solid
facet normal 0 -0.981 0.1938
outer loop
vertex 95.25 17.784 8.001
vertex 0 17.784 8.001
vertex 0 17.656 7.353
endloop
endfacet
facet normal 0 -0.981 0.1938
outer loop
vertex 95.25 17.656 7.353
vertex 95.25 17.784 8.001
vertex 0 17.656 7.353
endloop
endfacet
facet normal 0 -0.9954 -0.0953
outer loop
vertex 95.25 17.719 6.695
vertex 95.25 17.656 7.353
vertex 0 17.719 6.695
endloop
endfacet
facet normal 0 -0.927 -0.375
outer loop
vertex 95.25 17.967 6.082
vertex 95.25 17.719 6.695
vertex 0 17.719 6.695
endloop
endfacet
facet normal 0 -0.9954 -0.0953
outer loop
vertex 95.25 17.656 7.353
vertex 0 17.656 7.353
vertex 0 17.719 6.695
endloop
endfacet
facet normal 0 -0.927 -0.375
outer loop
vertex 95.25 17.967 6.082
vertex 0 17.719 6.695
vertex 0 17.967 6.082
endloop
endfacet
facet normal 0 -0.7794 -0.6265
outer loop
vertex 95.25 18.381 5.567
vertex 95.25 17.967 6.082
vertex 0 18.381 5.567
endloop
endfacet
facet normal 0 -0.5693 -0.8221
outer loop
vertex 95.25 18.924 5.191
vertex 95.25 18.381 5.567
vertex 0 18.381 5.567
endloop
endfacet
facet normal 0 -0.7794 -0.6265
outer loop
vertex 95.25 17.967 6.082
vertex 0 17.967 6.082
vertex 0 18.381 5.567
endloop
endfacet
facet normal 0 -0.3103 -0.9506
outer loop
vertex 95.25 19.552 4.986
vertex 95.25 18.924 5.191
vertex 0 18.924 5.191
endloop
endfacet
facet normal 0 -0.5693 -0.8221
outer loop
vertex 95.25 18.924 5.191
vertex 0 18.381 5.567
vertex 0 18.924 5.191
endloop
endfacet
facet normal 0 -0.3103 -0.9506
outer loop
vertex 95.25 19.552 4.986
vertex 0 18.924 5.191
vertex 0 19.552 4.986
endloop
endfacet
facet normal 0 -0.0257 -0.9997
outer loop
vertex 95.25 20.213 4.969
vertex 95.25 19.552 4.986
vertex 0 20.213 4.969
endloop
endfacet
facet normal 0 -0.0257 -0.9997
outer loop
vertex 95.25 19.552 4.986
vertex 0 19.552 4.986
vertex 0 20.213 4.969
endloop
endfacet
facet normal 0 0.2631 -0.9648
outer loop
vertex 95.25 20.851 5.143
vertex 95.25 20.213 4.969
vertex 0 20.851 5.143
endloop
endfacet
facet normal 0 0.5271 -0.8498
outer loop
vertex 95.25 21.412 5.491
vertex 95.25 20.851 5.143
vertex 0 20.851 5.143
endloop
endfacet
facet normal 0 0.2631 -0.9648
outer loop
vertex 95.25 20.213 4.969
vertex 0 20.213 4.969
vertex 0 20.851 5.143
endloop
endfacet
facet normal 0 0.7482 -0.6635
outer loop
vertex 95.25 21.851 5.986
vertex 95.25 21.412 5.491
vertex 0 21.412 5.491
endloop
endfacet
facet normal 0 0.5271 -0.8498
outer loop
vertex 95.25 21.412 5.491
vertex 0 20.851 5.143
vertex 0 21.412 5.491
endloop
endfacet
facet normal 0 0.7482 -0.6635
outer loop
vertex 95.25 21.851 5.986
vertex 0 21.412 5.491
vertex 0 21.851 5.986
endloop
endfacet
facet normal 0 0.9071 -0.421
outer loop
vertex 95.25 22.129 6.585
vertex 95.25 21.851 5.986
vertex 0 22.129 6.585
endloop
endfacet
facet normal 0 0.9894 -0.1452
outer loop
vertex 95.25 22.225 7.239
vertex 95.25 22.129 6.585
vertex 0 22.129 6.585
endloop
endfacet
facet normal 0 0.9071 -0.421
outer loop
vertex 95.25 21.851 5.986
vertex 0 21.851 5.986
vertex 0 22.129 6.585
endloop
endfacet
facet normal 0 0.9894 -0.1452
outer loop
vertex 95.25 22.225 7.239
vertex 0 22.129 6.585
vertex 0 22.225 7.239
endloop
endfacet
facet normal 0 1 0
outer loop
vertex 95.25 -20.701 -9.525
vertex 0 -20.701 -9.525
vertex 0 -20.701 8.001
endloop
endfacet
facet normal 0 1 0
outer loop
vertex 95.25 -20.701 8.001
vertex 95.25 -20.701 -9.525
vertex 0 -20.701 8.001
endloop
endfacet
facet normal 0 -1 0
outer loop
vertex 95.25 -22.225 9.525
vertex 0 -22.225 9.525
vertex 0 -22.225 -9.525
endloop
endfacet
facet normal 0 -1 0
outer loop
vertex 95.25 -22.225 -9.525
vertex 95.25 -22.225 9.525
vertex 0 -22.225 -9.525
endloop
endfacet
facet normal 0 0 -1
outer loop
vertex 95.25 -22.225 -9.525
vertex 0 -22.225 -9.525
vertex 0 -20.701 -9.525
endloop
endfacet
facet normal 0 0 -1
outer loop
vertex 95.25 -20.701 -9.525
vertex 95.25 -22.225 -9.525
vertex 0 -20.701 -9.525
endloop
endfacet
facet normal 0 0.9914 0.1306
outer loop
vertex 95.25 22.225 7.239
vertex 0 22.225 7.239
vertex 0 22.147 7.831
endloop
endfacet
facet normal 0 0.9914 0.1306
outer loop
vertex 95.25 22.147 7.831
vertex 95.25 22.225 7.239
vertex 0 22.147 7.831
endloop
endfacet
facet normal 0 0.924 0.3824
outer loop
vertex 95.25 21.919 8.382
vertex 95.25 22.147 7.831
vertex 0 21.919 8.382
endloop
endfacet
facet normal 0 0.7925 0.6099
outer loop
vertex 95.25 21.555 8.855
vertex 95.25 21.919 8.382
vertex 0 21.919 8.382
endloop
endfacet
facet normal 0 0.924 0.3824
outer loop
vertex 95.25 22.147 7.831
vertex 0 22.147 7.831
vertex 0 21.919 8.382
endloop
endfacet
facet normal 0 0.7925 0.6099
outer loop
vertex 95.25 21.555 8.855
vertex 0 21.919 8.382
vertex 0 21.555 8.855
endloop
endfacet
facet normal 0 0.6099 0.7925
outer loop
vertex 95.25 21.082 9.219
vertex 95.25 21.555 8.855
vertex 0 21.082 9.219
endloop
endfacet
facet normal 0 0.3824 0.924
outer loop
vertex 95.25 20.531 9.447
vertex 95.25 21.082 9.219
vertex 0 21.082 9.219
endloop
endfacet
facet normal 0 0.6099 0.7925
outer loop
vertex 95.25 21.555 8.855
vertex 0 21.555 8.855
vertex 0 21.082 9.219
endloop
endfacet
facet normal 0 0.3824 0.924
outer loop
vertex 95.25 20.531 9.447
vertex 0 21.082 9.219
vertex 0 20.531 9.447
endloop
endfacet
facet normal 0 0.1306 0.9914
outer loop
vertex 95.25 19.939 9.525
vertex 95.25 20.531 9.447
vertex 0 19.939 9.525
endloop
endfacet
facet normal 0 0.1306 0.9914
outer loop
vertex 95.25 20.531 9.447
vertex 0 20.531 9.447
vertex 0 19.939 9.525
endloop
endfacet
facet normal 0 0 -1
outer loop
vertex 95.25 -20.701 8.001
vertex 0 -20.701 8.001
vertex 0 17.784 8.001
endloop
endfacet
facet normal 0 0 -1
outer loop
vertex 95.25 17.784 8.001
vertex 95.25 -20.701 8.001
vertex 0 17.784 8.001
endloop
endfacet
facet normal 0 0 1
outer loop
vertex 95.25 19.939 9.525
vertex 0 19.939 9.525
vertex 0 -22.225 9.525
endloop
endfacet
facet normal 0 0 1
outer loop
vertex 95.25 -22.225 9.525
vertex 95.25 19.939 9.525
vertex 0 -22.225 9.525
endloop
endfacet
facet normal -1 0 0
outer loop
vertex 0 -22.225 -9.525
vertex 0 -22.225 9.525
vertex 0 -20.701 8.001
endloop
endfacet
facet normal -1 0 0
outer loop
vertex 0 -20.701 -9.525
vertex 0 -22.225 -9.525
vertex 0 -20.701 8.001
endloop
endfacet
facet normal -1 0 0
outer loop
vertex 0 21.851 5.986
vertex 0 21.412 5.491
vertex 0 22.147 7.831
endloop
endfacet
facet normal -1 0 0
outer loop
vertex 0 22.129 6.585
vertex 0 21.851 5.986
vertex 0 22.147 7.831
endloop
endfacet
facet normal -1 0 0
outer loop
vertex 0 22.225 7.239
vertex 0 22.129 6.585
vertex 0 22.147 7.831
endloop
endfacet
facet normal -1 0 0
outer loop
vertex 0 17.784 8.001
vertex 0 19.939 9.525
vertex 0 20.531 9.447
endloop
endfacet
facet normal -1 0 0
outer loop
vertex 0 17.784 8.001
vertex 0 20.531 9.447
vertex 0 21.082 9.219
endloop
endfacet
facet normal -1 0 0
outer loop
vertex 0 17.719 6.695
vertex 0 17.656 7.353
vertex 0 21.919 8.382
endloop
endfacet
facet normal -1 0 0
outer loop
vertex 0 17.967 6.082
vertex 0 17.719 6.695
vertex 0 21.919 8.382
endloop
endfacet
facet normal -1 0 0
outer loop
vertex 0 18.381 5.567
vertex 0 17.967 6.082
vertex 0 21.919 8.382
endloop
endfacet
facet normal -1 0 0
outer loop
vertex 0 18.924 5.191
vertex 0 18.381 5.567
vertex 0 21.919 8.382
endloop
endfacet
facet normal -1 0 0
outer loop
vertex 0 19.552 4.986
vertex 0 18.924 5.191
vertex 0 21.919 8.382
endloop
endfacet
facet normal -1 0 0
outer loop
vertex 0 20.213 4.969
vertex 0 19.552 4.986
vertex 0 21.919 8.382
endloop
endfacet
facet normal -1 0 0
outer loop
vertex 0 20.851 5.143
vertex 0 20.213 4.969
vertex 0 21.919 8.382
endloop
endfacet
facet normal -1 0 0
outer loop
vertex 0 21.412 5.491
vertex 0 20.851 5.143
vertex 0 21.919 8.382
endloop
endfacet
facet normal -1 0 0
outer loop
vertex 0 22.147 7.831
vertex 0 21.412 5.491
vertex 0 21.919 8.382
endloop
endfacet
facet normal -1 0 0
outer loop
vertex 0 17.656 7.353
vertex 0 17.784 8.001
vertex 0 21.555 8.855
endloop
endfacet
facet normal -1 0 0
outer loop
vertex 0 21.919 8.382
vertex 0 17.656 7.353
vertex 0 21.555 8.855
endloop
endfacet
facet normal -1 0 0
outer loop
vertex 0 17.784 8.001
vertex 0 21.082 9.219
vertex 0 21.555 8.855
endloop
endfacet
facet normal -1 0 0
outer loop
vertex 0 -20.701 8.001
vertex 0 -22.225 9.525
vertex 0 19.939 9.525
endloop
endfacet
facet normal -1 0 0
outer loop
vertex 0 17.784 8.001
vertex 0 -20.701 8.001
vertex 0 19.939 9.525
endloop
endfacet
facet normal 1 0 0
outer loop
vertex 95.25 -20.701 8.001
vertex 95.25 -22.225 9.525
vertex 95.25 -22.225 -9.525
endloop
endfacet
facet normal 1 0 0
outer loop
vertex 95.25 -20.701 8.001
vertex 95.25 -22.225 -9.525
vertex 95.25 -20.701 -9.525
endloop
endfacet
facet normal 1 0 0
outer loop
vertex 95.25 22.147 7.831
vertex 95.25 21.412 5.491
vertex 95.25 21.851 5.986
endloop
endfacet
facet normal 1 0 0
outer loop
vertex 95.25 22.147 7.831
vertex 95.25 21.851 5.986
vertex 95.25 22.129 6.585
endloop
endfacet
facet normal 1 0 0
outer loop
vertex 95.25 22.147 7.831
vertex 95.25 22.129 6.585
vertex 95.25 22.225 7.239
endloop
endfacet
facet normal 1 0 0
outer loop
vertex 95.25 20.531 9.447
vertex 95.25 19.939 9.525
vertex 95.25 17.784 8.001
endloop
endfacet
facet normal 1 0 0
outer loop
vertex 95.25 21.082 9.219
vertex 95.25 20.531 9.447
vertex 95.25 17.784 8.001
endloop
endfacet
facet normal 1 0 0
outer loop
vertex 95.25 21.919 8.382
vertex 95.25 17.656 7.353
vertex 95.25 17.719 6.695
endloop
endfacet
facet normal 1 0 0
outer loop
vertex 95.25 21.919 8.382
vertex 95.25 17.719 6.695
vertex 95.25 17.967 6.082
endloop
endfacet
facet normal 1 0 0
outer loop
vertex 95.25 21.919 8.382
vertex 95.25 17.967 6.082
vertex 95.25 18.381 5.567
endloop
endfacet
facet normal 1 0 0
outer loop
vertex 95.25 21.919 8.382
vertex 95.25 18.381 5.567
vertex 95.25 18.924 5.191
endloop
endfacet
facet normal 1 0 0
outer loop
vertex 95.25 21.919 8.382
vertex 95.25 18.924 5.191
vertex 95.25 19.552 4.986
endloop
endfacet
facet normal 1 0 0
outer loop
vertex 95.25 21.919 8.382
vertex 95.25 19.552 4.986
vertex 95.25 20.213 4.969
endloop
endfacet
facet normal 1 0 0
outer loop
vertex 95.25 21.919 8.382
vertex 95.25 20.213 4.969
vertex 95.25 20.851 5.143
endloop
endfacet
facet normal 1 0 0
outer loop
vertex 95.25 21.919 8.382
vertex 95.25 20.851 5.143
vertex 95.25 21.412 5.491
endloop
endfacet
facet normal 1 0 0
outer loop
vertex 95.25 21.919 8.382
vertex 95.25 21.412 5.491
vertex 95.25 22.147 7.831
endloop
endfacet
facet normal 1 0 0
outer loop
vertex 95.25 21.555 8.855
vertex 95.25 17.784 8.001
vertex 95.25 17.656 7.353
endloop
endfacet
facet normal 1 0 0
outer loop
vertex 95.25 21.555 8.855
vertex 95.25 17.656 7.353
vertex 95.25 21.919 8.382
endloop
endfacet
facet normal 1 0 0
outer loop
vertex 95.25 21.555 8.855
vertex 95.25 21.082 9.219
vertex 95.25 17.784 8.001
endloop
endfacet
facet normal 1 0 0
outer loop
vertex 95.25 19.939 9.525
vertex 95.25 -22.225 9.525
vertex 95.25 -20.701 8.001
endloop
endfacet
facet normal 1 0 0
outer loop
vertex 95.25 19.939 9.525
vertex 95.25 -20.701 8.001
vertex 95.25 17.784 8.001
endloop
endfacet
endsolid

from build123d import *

# Parameters (mm, degrees)
F1_DEPTH = 95.25


with BuildPart() as f1:
    # F0 (on Right) → F1 (new body)
    with BuildSketch(Plane.YZ):
        with BuildLine():
            ThreePointArc((22.225, 7.239), (21.555446, 8.855446), (19.939, 9.525))
            ThreePointArc((19.939, 9.525), (18.619177, 9.105511), (17.783739, 8.001))
            ThreePointArc((17.783739, 8.001), (19.552433, 4.985922), (22.225, 7.239))
        make_face()
        with BuildLine():
            ThreePointArc((17.783739, 8.001), (18.619177, 9.105511), (19.939, 9.525))
            Line((19.939, 9.525), (-22.225, 9.525))
            Line((-22.225, 9.525), (-22.225, -9.525))
            Line((-22.225, -9.525), (-20.701, -9.525))
            Line((-20.701, -9.525), (-20.701, 8.001))
            Line((-20.701, 8.001), (17.783739, 8.001))
        make_face()
    extrude(amount=F1_DEPTH)


solid = f1.part
